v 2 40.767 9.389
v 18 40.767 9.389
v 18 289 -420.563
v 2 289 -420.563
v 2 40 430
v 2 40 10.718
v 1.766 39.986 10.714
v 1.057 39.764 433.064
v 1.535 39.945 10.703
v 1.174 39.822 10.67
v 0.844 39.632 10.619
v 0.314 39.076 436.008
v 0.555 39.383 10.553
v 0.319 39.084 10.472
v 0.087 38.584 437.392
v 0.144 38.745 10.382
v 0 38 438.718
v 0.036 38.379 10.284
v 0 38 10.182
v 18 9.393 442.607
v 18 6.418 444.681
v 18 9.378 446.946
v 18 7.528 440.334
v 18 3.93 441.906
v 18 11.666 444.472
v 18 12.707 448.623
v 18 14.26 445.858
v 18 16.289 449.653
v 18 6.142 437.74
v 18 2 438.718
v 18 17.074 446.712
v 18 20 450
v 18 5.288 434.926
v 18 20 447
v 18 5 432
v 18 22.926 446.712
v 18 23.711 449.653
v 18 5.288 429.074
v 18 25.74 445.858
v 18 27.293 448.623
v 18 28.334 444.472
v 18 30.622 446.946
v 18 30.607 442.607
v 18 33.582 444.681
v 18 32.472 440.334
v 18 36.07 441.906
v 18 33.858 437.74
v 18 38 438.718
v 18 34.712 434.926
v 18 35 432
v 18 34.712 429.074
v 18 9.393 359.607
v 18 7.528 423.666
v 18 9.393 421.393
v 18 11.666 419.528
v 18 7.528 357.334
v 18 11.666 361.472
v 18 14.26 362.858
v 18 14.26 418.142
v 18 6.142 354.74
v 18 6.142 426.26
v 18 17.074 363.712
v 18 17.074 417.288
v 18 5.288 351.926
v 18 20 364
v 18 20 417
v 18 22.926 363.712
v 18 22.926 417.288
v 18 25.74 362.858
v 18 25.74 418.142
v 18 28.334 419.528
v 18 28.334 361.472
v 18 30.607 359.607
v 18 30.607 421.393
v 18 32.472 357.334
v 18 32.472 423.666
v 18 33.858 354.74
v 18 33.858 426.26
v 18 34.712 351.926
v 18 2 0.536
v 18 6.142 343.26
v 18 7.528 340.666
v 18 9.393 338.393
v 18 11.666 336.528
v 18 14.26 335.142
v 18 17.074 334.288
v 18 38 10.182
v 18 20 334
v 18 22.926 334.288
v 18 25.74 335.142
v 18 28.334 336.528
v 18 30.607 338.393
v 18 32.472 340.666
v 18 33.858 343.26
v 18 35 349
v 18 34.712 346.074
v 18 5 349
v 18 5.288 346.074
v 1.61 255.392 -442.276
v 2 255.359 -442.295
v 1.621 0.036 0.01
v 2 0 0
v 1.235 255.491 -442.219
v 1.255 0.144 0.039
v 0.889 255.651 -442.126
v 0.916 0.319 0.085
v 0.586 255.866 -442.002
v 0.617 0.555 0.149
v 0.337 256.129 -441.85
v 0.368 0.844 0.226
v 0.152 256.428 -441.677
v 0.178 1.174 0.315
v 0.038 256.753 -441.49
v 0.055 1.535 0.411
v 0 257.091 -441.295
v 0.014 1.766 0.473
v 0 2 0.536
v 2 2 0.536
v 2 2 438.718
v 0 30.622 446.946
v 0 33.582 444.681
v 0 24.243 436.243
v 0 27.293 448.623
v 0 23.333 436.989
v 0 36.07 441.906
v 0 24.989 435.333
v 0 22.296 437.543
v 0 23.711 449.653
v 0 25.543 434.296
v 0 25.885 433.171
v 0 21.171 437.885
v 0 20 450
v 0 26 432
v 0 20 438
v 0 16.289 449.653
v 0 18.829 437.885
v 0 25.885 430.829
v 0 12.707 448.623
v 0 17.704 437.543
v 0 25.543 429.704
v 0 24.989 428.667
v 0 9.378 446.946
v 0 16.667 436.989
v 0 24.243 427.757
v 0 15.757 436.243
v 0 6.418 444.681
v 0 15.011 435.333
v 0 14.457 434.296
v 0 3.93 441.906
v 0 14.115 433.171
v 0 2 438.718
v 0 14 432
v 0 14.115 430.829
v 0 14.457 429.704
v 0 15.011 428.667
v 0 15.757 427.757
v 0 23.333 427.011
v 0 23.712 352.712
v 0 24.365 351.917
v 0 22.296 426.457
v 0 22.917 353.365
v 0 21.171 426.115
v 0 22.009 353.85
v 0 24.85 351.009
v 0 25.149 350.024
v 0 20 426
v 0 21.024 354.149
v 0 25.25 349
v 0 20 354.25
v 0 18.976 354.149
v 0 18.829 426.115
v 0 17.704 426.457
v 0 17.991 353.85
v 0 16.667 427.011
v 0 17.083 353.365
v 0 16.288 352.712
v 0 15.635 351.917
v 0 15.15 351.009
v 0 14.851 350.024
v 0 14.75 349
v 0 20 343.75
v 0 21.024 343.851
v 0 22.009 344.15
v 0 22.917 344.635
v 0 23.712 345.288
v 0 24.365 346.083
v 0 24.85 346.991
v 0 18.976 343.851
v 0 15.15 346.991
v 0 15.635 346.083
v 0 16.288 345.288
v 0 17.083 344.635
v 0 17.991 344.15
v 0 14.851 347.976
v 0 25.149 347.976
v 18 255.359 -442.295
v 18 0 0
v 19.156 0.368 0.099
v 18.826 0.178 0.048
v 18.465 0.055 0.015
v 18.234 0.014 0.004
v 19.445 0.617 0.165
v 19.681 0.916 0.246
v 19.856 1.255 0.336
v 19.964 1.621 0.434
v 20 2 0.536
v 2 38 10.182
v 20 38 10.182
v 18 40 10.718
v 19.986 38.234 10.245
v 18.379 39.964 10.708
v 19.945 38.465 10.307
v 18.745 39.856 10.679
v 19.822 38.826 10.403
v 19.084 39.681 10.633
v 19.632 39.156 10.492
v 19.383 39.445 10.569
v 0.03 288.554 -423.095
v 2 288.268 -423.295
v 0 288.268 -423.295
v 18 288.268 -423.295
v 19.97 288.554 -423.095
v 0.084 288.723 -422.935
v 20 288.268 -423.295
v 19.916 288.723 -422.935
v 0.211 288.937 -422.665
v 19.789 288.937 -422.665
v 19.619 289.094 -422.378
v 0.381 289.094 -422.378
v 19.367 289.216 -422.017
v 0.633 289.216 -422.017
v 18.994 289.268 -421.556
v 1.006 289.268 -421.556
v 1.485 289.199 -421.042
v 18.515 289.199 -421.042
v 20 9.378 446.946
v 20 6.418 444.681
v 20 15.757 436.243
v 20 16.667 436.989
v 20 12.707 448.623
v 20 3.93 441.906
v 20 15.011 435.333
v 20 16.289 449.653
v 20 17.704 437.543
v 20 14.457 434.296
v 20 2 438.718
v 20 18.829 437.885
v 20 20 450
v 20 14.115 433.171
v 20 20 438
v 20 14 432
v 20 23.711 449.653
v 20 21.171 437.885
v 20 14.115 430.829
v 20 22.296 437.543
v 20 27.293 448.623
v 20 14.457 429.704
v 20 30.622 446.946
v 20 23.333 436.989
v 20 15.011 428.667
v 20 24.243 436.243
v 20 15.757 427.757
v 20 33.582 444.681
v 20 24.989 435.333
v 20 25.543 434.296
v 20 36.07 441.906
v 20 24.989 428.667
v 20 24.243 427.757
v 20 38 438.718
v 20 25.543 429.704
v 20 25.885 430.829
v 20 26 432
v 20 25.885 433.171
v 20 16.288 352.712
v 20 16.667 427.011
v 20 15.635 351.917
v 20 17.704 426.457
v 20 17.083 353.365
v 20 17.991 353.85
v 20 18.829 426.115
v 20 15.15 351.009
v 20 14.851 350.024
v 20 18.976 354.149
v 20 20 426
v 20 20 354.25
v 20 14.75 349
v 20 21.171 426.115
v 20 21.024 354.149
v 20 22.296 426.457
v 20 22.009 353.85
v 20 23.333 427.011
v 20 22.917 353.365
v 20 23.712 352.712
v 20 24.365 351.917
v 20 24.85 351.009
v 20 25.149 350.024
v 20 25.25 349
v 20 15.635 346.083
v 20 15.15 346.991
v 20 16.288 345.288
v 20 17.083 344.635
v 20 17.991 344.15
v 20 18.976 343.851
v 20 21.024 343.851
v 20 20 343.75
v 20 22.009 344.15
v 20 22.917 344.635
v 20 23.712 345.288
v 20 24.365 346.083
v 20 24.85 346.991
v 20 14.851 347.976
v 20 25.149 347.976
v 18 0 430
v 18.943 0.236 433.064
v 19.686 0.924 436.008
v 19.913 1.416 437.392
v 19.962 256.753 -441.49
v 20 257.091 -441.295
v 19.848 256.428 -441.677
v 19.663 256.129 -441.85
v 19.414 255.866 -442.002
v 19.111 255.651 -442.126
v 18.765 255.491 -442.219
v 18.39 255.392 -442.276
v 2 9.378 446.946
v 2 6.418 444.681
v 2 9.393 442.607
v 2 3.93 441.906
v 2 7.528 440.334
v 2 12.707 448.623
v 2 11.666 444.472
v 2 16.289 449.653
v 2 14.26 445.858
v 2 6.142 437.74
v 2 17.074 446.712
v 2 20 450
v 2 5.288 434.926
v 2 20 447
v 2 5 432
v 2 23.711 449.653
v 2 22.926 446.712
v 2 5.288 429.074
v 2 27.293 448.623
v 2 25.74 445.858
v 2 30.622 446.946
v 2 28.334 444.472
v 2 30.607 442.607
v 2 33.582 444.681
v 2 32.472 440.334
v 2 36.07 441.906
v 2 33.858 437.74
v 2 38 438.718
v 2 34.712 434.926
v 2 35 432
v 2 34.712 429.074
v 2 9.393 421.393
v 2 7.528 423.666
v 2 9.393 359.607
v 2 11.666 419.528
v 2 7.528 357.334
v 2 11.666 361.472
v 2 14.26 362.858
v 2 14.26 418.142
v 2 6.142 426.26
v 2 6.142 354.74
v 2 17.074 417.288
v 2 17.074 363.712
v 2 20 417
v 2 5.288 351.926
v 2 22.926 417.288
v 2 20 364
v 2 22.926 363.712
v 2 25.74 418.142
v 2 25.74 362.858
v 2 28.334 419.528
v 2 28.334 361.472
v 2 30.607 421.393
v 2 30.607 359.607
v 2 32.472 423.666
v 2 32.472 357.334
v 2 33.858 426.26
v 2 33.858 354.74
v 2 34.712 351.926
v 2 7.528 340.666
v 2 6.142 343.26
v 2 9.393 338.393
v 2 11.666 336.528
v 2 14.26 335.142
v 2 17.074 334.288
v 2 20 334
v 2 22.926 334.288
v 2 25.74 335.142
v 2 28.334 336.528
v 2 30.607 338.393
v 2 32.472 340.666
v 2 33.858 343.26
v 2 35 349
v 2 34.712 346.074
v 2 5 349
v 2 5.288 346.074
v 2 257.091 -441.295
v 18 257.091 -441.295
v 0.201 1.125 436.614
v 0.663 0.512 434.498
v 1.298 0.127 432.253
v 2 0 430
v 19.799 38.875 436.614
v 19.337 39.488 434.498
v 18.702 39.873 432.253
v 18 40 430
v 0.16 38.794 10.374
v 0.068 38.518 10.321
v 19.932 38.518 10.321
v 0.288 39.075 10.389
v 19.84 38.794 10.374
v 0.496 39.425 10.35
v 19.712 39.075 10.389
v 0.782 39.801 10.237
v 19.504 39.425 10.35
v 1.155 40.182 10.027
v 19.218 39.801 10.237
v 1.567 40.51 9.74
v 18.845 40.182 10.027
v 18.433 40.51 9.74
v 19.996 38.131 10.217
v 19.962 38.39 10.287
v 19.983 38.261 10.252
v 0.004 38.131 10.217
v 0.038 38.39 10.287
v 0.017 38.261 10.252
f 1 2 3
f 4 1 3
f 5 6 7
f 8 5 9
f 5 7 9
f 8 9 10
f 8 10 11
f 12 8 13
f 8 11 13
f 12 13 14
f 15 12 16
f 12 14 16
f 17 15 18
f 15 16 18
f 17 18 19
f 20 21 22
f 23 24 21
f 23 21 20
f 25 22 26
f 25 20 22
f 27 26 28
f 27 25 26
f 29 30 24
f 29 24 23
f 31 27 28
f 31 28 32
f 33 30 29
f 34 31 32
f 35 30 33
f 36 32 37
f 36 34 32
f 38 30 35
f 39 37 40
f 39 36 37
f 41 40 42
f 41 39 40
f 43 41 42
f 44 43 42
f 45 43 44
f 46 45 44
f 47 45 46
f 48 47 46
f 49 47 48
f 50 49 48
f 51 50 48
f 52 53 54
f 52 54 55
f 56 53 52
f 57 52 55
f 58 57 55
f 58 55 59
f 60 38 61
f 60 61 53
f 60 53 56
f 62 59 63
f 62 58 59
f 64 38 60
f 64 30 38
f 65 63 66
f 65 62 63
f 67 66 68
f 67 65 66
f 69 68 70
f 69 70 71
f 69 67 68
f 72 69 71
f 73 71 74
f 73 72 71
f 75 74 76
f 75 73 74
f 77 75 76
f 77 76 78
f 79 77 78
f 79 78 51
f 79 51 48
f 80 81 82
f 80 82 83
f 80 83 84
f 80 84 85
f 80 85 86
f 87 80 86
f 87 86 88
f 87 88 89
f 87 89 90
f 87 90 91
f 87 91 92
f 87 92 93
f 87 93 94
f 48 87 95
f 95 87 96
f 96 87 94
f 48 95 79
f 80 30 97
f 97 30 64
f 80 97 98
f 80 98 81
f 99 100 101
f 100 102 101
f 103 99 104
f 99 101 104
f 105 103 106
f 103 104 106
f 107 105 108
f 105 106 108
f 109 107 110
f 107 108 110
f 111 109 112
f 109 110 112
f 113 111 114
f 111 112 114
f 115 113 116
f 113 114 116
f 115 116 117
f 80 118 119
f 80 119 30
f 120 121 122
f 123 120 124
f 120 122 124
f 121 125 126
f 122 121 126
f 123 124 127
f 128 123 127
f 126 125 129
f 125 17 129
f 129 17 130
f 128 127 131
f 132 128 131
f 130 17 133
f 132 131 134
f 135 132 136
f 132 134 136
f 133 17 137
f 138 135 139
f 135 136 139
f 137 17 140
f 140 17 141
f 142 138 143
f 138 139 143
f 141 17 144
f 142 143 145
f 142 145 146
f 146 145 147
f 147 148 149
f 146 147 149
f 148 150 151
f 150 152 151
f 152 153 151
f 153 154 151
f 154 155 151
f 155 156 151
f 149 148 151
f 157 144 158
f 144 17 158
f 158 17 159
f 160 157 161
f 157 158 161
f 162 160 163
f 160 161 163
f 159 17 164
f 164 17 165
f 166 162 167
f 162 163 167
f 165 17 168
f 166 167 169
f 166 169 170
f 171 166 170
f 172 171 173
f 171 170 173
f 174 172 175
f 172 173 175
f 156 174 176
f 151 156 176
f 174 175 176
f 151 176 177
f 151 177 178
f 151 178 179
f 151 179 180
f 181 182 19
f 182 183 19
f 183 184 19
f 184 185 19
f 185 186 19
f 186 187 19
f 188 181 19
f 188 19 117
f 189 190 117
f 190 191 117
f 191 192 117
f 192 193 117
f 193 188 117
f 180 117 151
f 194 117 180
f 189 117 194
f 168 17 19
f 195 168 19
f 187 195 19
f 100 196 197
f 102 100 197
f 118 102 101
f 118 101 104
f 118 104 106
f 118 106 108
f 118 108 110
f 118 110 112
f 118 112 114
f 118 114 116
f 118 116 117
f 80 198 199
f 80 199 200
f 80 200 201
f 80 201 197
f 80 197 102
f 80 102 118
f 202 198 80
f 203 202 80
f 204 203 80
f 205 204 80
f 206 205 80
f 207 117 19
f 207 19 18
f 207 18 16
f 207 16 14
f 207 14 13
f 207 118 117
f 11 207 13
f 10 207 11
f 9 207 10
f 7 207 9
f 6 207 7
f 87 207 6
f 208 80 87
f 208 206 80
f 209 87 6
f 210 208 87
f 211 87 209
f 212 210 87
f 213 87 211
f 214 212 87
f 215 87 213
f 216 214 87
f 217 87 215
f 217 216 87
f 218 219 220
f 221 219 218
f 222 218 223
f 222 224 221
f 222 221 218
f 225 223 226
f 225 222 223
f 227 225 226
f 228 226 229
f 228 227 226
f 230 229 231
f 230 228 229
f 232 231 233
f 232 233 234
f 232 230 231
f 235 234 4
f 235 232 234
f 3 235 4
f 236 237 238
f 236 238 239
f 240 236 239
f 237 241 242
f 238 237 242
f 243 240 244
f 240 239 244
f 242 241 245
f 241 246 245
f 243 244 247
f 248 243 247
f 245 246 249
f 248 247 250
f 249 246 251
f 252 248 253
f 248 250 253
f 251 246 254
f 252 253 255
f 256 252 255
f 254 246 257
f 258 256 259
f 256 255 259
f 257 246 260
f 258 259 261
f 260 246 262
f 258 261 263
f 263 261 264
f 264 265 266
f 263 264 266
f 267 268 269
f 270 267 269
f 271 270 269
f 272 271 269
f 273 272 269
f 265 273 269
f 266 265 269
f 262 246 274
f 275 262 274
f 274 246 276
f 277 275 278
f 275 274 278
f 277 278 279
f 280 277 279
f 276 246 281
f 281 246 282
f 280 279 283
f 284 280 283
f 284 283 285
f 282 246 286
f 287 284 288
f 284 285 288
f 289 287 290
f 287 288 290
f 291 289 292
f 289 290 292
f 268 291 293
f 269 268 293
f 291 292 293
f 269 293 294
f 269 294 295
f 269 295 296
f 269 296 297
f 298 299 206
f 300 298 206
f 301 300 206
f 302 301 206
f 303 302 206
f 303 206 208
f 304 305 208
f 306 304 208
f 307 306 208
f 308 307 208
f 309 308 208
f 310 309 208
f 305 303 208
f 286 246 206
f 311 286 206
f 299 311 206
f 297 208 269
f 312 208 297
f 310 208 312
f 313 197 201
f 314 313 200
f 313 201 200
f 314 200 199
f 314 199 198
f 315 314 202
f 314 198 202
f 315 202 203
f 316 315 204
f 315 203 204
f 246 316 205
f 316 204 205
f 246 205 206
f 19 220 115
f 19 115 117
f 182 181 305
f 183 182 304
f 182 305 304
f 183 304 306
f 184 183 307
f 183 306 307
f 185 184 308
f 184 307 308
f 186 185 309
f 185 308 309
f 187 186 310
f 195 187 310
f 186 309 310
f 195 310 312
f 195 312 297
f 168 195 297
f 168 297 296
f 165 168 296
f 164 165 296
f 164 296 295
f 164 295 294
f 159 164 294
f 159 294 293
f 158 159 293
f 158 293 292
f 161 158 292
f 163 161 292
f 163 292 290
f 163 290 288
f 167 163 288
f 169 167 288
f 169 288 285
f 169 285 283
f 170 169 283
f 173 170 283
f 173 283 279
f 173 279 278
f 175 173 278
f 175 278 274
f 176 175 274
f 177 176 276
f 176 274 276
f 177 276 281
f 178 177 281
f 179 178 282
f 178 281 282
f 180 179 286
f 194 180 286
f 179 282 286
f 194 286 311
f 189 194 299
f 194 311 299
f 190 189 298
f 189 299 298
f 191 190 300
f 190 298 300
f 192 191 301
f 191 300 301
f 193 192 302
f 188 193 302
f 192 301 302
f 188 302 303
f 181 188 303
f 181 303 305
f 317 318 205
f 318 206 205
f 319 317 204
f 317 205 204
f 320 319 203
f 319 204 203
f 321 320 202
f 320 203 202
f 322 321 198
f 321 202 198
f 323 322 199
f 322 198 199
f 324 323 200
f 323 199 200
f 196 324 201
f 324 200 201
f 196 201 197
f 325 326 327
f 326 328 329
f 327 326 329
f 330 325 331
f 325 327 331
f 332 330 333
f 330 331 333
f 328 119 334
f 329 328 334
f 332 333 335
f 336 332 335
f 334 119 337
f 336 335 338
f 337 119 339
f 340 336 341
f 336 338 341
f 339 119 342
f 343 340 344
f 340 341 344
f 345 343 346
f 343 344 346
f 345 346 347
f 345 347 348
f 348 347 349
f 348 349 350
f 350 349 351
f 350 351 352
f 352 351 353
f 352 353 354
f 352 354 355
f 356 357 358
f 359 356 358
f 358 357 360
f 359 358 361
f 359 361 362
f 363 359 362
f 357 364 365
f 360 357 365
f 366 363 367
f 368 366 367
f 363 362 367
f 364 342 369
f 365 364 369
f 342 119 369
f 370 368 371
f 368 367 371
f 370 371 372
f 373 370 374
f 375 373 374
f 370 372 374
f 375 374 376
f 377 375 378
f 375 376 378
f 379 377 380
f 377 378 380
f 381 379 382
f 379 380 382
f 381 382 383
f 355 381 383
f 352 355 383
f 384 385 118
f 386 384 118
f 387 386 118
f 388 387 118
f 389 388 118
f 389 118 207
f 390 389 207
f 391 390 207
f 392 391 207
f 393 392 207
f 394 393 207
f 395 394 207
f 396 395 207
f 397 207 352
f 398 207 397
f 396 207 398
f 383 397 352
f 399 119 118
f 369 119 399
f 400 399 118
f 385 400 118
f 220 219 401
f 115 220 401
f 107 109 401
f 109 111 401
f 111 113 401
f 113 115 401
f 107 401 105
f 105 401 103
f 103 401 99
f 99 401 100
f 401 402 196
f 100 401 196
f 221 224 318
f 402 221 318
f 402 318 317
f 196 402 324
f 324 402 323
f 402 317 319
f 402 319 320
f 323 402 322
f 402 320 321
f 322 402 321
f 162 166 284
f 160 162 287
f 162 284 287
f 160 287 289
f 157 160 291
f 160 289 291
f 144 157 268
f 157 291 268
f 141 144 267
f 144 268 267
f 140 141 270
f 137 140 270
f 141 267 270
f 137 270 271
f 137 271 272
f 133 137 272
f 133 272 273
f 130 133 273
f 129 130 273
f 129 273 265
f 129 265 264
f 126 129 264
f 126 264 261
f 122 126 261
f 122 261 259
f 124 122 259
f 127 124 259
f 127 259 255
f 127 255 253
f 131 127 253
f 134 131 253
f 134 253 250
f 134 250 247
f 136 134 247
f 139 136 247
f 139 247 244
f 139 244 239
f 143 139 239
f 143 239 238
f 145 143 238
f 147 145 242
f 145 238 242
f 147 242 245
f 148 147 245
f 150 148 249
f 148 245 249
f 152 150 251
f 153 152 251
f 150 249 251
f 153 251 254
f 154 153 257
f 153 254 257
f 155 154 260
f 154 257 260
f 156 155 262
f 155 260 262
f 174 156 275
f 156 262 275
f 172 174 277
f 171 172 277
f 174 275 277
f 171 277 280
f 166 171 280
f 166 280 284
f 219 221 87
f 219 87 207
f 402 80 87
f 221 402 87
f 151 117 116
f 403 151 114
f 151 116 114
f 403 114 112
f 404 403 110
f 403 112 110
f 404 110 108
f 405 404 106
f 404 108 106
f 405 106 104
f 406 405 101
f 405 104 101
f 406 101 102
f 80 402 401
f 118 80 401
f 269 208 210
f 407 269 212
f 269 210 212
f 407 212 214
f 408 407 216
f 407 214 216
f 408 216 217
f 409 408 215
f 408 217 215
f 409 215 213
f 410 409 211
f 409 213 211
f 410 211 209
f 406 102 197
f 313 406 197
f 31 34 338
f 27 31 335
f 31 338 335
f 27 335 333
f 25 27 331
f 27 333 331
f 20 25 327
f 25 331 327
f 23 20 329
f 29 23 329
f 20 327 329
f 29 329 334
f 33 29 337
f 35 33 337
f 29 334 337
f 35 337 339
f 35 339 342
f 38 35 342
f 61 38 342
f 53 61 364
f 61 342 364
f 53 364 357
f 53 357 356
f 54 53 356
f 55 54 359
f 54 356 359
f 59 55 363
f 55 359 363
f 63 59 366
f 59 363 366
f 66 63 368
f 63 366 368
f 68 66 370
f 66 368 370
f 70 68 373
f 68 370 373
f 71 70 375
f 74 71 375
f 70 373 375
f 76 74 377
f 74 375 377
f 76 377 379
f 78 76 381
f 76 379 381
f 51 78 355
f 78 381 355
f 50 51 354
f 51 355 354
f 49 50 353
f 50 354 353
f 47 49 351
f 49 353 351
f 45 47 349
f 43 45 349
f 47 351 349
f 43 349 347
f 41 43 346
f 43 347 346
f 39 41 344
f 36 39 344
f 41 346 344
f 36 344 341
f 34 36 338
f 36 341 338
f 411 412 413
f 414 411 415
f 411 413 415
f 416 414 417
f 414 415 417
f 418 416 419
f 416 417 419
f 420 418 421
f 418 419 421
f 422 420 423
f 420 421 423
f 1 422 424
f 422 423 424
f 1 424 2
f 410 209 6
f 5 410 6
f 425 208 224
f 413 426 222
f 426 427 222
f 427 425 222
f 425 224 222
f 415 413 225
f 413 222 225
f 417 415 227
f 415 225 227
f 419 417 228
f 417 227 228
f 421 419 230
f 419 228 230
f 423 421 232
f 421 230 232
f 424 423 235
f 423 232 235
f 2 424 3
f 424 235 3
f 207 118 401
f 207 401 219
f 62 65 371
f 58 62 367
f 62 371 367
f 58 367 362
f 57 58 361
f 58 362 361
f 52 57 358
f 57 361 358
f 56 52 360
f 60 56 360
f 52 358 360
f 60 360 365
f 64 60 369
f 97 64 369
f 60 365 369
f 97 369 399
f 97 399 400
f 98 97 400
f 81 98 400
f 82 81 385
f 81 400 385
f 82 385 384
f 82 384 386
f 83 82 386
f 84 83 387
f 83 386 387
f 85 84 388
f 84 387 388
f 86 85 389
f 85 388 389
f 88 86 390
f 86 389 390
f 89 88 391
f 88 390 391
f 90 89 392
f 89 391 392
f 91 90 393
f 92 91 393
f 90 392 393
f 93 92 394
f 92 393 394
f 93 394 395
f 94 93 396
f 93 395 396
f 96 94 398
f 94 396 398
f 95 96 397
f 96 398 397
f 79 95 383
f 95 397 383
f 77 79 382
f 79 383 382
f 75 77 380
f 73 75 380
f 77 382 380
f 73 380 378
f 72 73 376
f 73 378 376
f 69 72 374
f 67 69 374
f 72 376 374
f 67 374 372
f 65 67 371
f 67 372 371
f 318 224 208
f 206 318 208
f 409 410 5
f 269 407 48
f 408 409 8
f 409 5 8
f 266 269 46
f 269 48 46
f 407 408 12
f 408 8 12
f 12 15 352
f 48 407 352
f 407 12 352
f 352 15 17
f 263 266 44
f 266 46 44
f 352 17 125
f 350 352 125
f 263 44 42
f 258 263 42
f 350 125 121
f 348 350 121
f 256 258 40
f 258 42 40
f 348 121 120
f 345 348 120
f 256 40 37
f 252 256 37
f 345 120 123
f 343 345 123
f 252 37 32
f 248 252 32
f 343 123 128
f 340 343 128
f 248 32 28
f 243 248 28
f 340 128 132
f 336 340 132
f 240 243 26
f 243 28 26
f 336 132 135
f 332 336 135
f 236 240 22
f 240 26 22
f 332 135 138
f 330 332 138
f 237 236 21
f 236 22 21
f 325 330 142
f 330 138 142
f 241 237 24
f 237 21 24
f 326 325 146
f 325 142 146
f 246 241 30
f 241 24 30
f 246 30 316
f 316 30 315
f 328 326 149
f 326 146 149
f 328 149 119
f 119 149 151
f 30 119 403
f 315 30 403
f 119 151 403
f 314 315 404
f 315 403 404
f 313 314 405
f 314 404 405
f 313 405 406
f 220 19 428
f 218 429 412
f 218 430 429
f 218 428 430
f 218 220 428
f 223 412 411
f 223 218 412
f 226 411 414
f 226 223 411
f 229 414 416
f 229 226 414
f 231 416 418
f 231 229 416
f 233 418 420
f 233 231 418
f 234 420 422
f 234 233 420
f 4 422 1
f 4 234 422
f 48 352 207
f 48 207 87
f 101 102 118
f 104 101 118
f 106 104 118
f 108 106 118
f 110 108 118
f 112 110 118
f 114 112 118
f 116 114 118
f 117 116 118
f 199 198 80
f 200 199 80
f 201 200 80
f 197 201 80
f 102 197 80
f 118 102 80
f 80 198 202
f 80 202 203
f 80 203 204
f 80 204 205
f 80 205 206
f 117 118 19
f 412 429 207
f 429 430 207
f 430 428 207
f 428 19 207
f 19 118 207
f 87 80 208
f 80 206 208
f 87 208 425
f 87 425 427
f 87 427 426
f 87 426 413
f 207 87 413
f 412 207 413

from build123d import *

# Parameters (mm, degrees)
SCHIZZO1_W                    = 16
SCHIZZO1_H                    = 36
ESTRUSIONE_SOTTILE1_DEPTH     = 450
SCHIZZO2_R                    = 15
ESTRUSIONE_ESTRUSIONE1_DEPTH  = 16
RIPETIZIONE_A_L1_COUNT        = 2
RIPETIZIONE_A_L1_PITCH        = 83
SCHIZZO3_R                    = 6
SCHIZZO3_R_2                  = 5.25
TAGLIO_ESTRUSIONE1_DEPTH      = 453.216762184
TAGLIO_ESTRUSIONE2_DEPTH      = 453.216762184
RACCORDO1_R                   = 20
ESTRUSIONE_ESTRUSIONE2_DEPTH  = 10
RACCORDO2_R                   = 2
TAGLIO_ESTRUSIONE3_DEPTH      = 929.330815786
TAGLIO_ESTRUSIONE3_DEPTH_BACK = 929.330815786
SCHIZZO7_W                    = 16
SCHIZZO7_H                    = 36


with BuildPart() as part:
    # Schizzo1 → Estrusione-Sottile1 (new body)
    with BuildSketch(Plane.XY):
        with BuildLine():
            Line((0, 38), (0, 2))
            ThreePointArc((0, 2), (0.585786438, 0.585786438), (2, 0))
            Line((2, 0), (18, 0))
            ThreePointArc((18, 0), (19.414213562, 0.585786438), (20, 2))
            Line((20, 2), (20, 38))
            ThreePointArc((20, 38), (19.414213562, 39.414213562), (18, 40))
            Line((18, 40), (2, 40))
            ThreePointArc((2, 40), (0.585786438, 39.414213562), (0, 38))
        make_face()
        with Locations((10, 20)):
            Rectangle(SCHIZZO1_W, SCHIZZO1_H, mode=Mode.SUBTRACT)
    extrude(amount=ESTRUSIONE_SOTTILE1_DEPTH)

    # Schizzo2 → Estrusione-Estrusione1 (add)
    with BuildSketch(Plane(origin=(2, 0, 0), x_dir=(0, 0, -1), z_dir=(1, 0, 0))):
        with Locations(Location((-432, 20, 0), (0, 0, 180))):
            Circle(SCHIZZO2_R)
    estrusione_estrusione1 = extrude(amount=ESTRUSIONE_ESTRUSIONE1_DEPTH)

    # Ripetizione a L1: Estrusione-Estrusione1 ×2
    with Locations(*[(0, 0, -i * RIPETIZIONE_A_L1_PITCH) for i in range(1, RIPETIZIONE_A_L1_COUNT)]):
        add(estrusione_estrusione1)

    # Schizzo3 → Taglio-Estrusione1 (cut, through all)
    with BuildSketch(Plane(origin=(20, 0, 0), x_dir=(0, 0, -1), z_dir=(1, 0, 0))):
        with Locations((-432, 20)):
            Circle(SCHIZZO3_R)
        with Locations((-349, 20)):
            Circle(SCHIZZO3_R_2)
    extrude(amount=-TAGLIO_ESTRUSIONE1_DEPTH, mode=Mode.SUBTRACT)

    # Schizzo4 → Taglio-Estrusione2 (cut, through all)
    with BuildSketch(Plane(origin=(20, 0, 0), x_dir=(0, 0, -1), z_dir=(1, 0, 0))):
        Polygon((0, 0), (-10.717967697, 40), (0, 40), align=None)
    extrude(amount=-TAGLIO_ESTRUSIONE2_DEPTH, mode=Mode.SUBTRACT)

    # Raccordo1
    # the kernel refuses this fillet: 20 mm, written as the material it takes off along each edge
    with BuildSketch(Plane(origin=(-48, 0, 450), x_dir=(0, 1, 0), z_dir=(1, 0, 0)), Plane(origin=(68, 40, 450), x_dir=(0, -1, 0), z_dir=(-1, 0, 0))) as raccordo1_piece_1:
        with BuildLine():
            CenterArc((RACCORDO1_R, -RACCORDO1_R), RACCORDO1_R, 90, 90)
            Line((0, -RACCORDO1_R), (0, 0))
            Line((0, 0), (RACCORDO1_R, 0))
        make_face()
    extrude(amount=116, mode=Mode.SUBTRACT)


with BuildPart() as body_2:
    # Schizzo5 → Estrusione-Estrusione2 (new, symmetric)
    with BuildSketch(Plane(origin=(10, 0, 0), x_dir=(0, 0, -1), z_dir=(1, 0, 0))):
        Polygon((422.294734195, 290), (442.294734195, 255.358983849), (0, 0), (-10.717967697, 40), align=None)
    extrude(amount=ESTRUSIONE_ESTRUSIONE2_DEPTH, both=True)

    # Raccordo2
    raccordo2_edges = [body_2.edges().sort_by_distance(p)[0] for p in [
        (20, 165, -205.788383249),
        (20, 127.679491924, -221.147367097),
        (0, 165, -205.788383249),
        (0, 127.679491924, -221.147367097),
        (10, 40, 10.717967697),
        (10, 290, -422.294734195),
    ]]
    fillet(raccordo2_edges, radius=RACCORDO2_R)

    # Schizzo7 → Taglio-Estrusione3 (cut, two sides: drawn at the far end of the back side and taken through both)
    with BuildSketch(Plane(origin=(0, 255.358983849, -442.294734195), x_dir=(-1, 0, 0), z_dir=(0, 0.4999999999999891, -0.8660254037844448)).offset(-TAGLIO_ESTRUSIONE3_DEPTH_BACK)):
        with Locations((-10, 20)):
            Rectangle(SCHIZZO7_W, SCHIZZO7_H)
    extrude(amount=TAGLIO_ESTRUSIONE3_DEPTH + TAGLIO_ESTRUSIONE3_DEPTH_BACK, mode=Mode.SUBTRACT)


solid = Compound([part.part, body_2.part])
